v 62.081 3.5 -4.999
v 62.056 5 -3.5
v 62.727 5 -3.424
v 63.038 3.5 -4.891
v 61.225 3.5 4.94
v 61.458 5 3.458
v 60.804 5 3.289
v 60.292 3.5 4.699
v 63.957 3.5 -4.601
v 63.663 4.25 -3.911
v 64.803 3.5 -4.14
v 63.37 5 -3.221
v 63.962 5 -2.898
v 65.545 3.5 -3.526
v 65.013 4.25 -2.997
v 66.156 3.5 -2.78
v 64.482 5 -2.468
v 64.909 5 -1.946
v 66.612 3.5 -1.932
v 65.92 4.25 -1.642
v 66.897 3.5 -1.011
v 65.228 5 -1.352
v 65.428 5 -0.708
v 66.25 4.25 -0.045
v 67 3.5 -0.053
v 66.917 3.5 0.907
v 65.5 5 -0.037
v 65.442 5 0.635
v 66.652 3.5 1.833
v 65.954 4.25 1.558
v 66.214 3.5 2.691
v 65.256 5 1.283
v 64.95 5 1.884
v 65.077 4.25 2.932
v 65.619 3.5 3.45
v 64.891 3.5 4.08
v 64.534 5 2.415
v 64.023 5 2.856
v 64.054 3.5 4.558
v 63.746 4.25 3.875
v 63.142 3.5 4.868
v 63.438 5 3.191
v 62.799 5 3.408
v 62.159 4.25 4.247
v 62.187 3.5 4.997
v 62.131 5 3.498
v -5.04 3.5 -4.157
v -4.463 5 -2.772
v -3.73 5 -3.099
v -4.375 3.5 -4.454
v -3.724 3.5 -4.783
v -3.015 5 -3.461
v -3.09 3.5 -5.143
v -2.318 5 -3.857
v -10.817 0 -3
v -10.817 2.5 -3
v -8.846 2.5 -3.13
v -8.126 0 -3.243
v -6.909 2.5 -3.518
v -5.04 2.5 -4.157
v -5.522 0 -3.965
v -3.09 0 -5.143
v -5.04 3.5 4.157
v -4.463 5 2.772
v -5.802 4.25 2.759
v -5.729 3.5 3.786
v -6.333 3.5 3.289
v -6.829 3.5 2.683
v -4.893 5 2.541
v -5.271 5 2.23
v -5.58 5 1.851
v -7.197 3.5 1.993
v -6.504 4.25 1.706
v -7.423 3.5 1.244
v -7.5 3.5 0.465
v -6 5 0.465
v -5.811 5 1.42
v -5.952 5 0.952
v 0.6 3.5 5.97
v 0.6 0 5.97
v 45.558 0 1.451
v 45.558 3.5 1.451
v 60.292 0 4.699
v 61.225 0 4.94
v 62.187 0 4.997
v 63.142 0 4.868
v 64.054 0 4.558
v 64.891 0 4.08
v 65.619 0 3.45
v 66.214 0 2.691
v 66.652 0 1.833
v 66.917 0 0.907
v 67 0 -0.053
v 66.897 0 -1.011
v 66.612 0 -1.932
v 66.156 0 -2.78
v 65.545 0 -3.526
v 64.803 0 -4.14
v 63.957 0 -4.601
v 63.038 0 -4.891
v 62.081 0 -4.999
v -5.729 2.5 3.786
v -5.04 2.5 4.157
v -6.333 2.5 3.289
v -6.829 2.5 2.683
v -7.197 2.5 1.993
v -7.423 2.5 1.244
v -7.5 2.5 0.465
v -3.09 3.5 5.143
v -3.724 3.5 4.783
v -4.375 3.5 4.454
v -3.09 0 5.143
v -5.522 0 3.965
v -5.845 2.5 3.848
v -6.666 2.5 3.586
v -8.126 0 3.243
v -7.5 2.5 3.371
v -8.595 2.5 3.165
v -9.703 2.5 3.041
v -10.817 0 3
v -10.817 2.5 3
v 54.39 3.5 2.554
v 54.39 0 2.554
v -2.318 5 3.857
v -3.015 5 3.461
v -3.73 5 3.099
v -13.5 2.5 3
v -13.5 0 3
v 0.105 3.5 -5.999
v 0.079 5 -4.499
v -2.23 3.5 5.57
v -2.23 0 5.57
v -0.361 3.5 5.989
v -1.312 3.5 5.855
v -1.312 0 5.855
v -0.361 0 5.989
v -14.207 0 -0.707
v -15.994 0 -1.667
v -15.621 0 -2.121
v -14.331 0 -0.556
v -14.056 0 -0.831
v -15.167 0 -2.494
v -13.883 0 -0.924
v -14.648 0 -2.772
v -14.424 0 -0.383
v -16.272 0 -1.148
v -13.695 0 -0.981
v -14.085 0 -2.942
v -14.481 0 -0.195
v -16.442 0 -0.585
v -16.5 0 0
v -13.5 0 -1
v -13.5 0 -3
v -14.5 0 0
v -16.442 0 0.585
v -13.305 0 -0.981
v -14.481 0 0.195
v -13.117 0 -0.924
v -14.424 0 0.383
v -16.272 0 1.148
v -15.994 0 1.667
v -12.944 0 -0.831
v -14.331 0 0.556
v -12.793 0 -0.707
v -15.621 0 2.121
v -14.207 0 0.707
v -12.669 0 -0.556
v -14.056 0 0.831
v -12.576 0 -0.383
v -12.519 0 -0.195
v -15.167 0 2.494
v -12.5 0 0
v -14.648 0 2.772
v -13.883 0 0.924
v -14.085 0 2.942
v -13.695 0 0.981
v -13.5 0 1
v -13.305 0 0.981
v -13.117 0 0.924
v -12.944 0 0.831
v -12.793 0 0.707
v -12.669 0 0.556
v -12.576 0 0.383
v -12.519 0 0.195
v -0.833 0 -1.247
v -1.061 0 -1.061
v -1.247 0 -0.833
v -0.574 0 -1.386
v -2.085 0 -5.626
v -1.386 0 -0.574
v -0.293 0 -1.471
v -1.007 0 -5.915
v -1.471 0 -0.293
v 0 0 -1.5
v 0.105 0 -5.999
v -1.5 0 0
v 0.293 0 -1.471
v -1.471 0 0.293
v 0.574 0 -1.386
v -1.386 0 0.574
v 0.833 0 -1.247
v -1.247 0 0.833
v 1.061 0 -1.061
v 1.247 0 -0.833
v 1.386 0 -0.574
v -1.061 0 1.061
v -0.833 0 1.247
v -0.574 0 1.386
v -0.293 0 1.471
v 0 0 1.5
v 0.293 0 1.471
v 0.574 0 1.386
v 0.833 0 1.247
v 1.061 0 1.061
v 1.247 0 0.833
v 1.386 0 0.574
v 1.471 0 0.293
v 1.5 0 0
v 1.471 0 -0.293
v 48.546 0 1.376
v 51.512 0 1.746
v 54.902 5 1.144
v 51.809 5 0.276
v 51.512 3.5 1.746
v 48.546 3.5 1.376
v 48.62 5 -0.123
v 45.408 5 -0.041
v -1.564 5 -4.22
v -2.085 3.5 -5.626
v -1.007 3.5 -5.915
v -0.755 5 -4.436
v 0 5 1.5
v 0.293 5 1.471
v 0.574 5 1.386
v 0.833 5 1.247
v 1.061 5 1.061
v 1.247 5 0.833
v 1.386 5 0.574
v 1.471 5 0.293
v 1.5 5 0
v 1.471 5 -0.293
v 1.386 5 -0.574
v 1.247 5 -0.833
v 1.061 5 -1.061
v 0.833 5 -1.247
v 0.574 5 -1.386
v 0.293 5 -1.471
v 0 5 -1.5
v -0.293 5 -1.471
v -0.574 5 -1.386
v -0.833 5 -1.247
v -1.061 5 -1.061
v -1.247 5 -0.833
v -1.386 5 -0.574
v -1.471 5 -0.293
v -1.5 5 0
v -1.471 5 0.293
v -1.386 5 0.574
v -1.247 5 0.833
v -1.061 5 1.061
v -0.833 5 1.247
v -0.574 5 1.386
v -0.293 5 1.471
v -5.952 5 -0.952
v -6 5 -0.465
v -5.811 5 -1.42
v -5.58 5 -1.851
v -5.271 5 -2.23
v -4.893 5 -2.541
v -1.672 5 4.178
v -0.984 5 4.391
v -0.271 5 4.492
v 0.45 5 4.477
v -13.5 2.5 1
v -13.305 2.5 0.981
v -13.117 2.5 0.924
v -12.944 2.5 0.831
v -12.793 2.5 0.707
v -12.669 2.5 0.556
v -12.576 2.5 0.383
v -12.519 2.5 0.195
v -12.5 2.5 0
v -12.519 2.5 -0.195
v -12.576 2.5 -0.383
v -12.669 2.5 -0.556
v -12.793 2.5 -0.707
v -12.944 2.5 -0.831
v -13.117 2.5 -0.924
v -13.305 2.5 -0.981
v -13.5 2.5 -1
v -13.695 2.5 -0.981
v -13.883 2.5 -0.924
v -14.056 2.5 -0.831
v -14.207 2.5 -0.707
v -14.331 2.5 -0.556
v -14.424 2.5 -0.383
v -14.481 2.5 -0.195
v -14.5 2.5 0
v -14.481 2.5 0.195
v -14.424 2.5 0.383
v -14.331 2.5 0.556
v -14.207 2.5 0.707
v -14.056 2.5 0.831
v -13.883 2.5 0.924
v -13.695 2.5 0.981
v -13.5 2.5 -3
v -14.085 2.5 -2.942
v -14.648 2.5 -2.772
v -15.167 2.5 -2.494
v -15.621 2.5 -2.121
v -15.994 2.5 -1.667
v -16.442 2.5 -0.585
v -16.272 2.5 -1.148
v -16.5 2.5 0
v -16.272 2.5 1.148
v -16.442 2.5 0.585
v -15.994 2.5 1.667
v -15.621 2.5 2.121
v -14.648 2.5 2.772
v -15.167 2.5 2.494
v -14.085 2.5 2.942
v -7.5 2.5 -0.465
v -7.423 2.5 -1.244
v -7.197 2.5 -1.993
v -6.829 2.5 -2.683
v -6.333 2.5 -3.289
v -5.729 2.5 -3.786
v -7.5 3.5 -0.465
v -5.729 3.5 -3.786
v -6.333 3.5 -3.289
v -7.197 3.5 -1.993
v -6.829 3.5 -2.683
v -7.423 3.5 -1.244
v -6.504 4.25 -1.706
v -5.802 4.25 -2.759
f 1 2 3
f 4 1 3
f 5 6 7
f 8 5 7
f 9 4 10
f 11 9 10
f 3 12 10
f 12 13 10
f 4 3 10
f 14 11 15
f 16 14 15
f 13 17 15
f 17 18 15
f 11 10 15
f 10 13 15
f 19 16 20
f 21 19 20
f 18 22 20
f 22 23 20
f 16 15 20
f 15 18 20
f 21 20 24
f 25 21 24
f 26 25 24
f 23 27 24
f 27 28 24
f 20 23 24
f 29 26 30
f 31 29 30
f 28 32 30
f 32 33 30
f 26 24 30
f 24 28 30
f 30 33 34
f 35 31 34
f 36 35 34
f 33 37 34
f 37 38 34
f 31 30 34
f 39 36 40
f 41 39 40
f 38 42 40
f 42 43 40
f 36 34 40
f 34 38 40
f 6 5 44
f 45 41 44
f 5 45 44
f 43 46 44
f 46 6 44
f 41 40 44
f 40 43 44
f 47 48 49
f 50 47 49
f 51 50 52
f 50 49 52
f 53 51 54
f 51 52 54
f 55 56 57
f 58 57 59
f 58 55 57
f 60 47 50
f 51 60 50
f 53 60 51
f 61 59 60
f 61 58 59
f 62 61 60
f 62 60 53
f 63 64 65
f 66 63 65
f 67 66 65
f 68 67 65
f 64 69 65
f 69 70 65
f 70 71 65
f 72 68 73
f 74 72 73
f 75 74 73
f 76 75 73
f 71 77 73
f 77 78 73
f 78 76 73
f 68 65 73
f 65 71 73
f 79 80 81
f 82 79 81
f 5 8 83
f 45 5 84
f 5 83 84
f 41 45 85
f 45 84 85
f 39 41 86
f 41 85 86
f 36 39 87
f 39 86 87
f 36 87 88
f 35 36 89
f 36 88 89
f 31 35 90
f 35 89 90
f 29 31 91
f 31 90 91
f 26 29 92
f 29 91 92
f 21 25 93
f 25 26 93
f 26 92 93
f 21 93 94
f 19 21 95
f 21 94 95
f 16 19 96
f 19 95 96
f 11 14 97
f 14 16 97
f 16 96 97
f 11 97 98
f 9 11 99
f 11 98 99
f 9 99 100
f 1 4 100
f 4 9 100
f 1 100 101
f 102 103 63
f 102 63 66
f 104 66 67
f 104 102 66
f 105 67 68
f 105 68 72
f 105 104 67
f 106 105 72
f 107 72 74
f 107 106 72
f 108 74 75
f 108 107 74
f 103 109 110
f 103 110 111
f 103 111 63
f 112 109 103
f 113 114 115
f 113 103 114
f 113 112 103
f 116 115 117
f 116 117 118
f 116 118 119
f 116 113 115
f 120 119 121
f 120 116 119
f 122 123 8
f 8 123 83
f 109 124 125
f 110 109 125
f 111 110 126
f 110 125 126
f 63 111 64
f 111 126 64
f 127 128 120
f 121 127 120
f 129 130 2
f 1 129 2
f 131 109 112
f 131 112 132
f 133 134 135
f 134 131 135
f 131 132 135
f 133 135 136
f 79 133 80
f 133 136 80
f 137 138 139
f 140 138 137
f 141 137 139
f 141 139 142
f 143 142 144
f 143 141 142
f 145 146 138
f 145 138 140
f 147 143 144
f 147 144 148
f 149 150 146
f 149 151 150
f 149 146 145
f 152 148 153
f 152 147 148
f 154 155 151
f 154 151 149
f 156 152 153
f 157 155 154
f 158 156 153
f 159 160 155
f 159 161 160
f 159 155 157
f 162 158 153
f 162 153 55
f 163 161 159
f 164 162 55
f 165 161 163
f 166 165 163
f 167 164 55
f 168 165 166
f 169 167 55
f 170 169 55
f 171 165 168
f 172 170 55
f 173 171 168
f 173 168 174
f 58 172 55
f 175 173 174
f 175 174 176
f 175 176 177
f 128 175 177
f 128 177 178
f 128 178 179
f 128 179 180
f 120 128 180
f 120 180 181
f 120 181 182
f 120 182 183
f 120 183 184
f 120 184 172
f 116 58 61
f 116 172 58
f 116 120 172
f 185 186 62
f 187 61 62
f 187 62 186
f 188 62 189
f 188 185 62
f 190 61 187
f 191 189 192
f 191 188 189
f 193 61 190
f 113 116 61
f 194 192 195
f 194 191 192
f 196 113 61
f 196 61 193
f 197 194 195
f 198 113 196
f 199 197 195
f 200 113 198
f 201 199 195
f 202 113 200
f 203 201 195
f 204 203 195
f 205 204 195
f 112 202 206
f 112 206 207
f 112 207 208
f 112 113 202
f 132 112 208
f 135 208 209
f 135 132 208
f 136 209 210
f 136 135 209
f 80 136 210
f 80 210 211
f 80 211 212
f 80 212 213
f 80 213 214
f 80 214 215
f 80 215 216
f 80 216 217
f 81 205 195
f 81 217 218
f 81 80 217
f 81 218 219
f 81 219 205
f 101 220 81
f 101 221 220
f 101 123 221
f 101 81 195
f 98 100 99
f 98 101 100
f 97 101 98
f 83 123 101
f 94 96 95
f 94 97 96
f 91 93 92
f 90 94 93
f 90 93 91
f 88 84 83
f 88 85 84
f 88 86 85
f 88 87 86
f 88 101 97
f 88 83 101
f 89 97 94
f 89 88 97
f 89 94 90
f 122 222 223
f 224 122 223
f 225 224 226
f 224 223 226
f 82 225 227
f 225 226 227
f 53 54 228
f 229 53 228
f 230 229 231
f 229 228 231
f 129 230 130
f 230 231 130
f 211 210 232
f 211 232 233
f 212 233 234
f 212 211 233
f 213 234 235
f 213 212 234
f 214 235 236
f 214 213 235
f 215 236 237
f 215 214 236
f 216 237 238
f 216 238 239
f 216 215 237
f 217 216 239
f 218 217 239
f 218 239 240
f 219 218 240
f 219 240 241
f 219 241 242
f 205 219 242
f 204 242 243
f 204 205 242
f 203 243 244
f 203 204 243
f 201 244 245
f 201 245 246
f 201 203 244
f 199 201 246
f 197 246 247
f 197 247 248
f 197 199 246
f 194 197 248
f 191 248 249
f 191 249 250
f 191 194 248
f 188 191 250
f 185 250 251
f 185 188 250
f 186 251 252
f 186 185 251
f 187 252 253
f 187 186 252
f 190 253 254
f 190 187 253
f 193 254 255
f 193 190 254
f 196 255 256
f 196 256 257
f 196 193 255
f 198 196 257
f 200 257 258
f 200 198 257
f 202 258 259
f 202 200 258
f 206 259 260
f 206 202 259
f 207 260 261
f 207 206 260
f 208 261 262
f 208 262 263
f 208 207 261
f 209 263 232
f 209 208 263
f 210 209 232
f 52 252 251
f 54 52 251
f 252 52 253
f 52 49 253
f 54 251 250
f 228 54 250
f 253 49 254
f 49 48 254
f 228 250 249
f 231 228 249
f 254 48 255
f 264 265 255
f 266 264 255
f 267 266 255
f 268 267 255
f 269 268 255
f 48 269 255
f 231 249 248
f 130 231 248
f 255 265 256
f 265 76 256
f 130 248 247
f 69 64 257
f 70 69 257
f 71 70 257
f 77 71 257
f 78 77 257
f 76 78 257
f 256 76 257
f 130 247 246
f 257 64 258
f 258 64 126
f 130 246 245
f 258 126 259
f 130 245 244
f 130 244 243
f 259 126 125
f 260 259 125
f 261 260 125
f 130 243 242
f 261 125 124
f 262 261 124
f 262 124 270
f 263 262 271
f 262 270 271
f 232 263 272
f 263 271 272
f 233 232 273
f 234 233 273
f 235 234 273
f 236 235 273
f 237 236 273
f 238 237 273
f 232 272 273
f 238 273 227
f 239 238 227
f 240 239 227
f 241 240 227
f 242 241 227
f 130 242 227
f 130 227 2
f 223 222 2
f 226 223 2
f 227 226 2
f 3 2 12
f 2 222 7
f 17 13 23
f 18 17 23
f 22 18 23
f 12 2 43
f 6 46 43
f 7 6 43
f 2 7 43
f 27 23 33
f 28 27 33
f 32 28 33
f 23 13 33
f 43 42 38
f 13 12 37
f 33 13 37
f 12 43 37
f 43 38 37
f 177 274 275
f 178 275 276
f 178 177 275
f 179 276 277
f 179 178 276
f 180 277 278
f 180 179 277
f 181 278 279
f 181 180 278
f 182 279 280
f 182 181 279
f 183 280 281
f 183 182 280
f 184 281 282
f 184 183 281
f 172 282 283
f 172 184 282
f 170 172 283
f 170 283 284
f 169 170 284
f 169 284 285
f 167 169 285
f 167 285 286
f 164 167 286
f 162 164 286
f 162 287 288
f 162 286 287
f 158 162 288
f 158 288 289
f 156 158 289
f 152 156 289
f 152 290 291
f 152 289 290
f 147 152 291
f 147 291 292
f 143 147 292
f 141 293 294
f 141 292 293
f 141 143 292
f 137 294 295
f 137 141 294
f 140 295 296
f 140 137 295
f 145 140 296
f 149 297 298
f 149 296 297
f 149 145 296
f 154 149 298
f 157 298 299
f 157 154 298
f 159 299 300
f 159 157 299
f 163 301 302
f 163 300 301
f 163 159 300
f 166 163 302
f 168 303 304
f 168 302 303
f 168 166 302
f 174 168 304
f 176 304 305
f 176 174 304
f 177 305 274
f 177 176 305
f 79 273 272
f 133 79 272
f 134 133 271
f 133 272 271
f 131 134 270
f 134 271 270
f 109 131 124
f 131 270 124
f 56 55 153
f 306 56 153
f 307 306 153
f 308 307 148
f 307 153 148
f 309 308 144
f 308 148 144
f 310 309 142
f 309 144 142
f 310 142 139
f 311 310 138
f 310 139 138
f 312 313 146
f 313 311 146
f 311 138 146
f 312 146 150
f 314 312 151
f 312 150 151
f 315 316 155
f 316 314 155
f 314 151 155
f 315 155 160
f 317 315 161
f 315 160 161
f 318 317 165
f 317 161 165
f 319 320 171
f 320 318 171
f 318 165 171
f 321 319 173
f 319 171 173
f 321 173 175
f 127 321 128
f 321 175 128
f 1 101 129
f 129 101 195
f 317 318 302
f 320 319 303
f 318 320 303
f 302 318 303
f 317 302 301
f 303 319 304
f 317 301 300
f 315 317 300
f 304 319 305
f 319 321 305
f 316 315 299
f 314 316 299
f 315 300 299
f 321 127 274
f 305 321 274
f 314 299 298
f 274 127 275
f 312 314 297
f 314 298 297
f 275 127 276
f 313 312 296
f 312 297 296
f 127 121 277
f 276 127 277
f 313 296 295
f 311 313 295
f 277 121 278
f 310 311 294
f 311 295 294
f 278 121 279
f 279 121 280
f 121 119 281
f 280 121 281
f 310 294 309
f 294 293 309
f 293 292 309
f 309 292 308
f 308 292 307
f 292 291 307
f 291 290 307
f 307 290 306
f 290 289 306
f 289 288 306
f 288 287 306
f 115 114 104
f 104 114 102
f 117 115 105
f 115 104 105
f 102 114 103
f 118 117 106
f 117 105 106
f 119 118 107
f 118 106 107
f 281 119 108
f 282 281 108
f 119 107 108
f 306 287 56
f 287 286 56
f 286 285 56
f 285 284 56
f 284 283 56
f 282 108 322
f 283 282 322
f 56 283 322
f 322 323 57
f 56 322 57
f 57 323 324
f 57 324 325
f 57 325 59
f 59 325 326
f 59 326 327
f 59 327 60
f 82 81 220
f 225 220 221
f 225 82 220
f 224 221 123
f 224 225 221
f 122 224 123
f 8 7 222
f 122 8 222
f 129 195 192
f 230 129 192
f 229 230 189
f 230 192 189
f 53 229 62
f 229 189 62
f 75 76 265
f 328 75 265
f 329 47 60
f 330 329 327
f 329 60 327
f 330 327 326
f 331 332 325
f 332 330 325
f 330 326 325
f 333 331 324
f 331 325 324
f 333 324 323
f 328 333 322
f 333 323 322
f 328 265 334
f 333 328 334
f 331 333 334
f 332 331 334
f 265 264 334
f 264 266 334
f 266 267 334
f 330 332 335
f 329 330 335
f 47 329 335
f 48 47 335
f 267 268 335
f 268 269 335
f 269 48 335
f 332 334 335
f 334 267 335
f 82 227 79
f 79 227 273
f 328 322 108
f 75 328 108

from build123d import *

# Parameters (mm, degrees)
SKETCH1_R           = 1.5
SKETCH1_R_2         = 1
BOSS_EXTRUDE1_DEPTH = 5
FILLET1_R           = 20
CUT_EXTRUDE1_START  = -2.5
CUT_EXTRUDE1_DEPTH  = 2.5
FILLET5_R           = 15
FILLET6_R           = 4
CHAMFER1_SIZE       = 1.5


with BuildPart() as part:
    # Sketch1 → Boss-Extrude1 (new body)
    with BuildSketch(Plane(origin=(0, 0, 0), x_dir=(1, 0, 0), z_dir=(0, 1, 0))):
        with BuildLine():
            Line((0.6, -5.969924623), (50.1, -0.994987437))
            Line((50.1, -0.994987437), (60.292075574, -4.699254638))
            ThreePointArc((60.292075574, -4.699254638), (66.917086627, -0.906785038), (62.080644677, 4.999349601))
            Line((62.080644677, 4.999349601), (0.105263158, 5.999076568))
            ThreePointArc((0.105263158, 5.999076568), (-2.95430253, 5.222269292), (-5.196152423, 3))
            Line((-5.196152423, 3), (-13.5, 3))
            ThreePointArc((-13.5, 3), (-16.5, 0), (-13.5, -3))
            Line((-13.5, -3), (-5.196152423, -3))
            ThreePointArc((-5.196152423, -3), (-2.736104409, -5.339825153), (0.6, -5.969924623))
        make_face()
        with Locations(Location((0, 0, 0), (0, 0, 270))):
            Circle(SKETCH1_R, mode=Mode.SUBTRACT)
        with Locations(Location((-13.5, 0, 0), (0, 0, 270))):
            Circle(SKETCH1_R_2, mode=Mode.SUBTRACT)
    extrude(amount=BOSS_EXTRUDE1_DEPTH)

    # Fillet1
    fillet1_edges = [part.edges().sort_by_distance(p)[0] for p in [
        (50.1, 2.5, 0.994987437),
    ]]
    fillet(fillet1_edges, radius=FILLET1_R)

    # Sketch2 → Cut-Extrude1 (cut)
    with BuildSketch(Plane(origin=(0, 5, 0), x_dir=(1, 0, 0), z_dir=(0, 1, 0)).offset(CUT_EXTRUDE1_START)):
        with BuildLine():
            Line((-13.5, 3), (-7.5, 3))
            Line((-7.5, 3), (-7.5, -3))
            Line((-7.5, -3), (-13.5, -3))
            ThreePointArc((-13.5, -3), (-16.5, 0), (-13.5, 3))
        make_face()
    extrude(amount=CUT_EXTRUDE1_DEPTH, mode=Mode.SUBTRACT)

    # Fillet5
    # the kernel refuses this fillet: 15 mm, written as the material it adds along each edge
    with BuildSketch(Plane(origin=(-5.196152423, 0, 3), x_dir=(0.7008923394400669, 0, 0.7132670807728548), z_dir=(0, 1, 0))) as fillet5_piece_1_section:
        with BuildLine():
            CenterArc((6.759639834, -14.52230372), FILLET5_R, 104.498640433, 31.002719134)
            Line((-3.939366378, -4.008918629), (0, 0))
            ThreePointArc((0, 0), (1.502142185, -0.191078512), (3.004284371, 0))
        make_face()
    fillet5_piece_1 = extrude(amount=5, mode=Mode.PRIVATE)
    fillet5_piece_1 = split(fillet5_piece_1, bisect_by=Plane(origin=(-7.5, 1.25, 3.544303671), z_dir=(1, 0, 0)), keep=Keep.TOP, mode=Mode.PRIVATE)
    fillet5_piece_1 = split(fillet5_piece_1, bisect_by=Plane(origin=(-5.459248891, 2.5, 3.544303671), z_dir=(0, -1, 0)), keep=Keep.TOP, mode=Mode.PRIVATE)
    add(fillet5_piece_1)
    with BuildSketch(Plane(origin=(-5.196152423, 0, 3), x_dir=(0.7008923394400669, 0, 0.7132670807728548), z_dir=(0, 1, 0))) as fillet5_piece_2_section:
        with BuildLine():
            CenterArc((6.759639834, -14.52230372), FILLET5_R, 104.498640433, 31.002719134)
            Line((-3.939366378, -4.008918629), (0, 0))
            ThreePointArc((0, 0), (1.502142185, -0.191078512), (3.004284371, 0))
        make_face()
    fillet5_piece_2 = extrude(amount=5, mode=Mode.PRIVATE)
    fillet5_piece_2 = split(fillet5_piece_2, bisect_by=Plane(origin=(-7.5, 1.25, 2.925994162), z_dir=(-1, 0, 0)), keep=Keep.TOP, mode=Mode.PRIVATE)
    fillet5_piece_2 = split(fillet5_piece_2, bisect_by=Plane(origin=(-8.916431377, 2.5, 2.925994162), z_dir=(0, -1, 0)), keep=Keep.TOP, mode=Mode.PRIVATE)
    add(fillet5_piece_2)
    with BuildSketch(Plane(origin=(-5.196152423, 0, 3), x_dir=(0.7008923394400669, 0, 0.7132670807728548), z_dir=(0, 1, 0))) as fillet5_piece_3_section:
        with BuildLine():
            CenterArc((6.759639834, -14.52230372), FILLET5_R, 104.498640433, 31.002719134)
            Line((-3.939366378, -4.008918629), (0, 0))
            ThreePointArc((0, 0), (1.502142185, -0.191078512), (3.004284371, 0))
        make_face()
    fillet5_piece_3 = extrude(amount=5, mode=Mode.PRIVATE)
    fillet5_piece_3 = split(fillet5_piece_3, bisect_by=Plane(origin=(-7.5, 3.75, 3.544303671), z_dir=(1, 0, 0)), keep=Keep.TOP, mode=Mode.PRIVATE)
    fillet5_piece_3 = split(fillet5_piece_3, bisect_by=Plane(origin=(-5.459248891, 2.5, 3.544303671), z_dir=(0, 1, 0)), keep=Keep.TOP, mode=Mode.PRIVATE)
    add(fillet5_piece_3)
    with BuildSketch(Plane(origin=(-5.196152423, 0, -3), x_dir=(-1, 0, 0), z_dir=(0, 1, 0))) as fillet5_piece_4_section:
        with BuildLine():
            CenterArc((5.620501404, -15), FILLET5_R, 90, 31.002719134)
            ThreePointArc((-2.105679901, -2.142857143), (-0.916549938, -1.205354037), (0, 0))
            Line((0, 0), (5.620501404, 0))
        make_face()
    fillet5_piece_4 = extrude(amount=5, mode=Mode.PRIVATE)
    fillet5_piece_4 = split(fillet5_piece_4, bisect_by=Plane(origin=(-8.916431377, 2.5, -2.925994162), z_dir=(0, -1, 0)), keep=Keep.TOP, mode=Mode.PRIVATE)
    fillet5_piece_4 = split(fillet5_piece_4, bisect_by=Plane(origin=(-7.5, 1.25, -2.925994162), z_dir=(-1, 0, 0)), keep=Keep.TOP, mode=Mode.PRIVATE)
    add(fillet5_piece_4)
    with BuildSketch(Plane(origin=(-5.196152423, 0, -3), x_dir=(-1, 0, 0), z_dir=(0, 1, 0))) as fillet5_piece_5_section:
        with BuildLine():
            CenterArc((5.620501404, -15), FILLET5_R, 90, 31.002719134)
            ThreePointArc((-2.105679901, -2.142857143), (-0.916549938, -1.205354037), (0, 0))
            Line((0, 0), (5.620501404, 0))
        make_face()
    fillet5_piece_5 = extrude(amount=5, mode=Mode.PRIVATE)
    fillet5_piece_5 = split(fillet5_piece_5, bisect_by=Plane(origin=(-5.459248891, 2.5, -3.544303671), z_dir=(0, -1, 0)), keep=Keep.TOP, mode=Mode.PRIVATE)
    fillet5_piece_5 = split(fillet5_piece_5, bisect_by=Plane(origin=(-7.5, 1.25, -3.544303671), z_dir=(1, 0, 0)), keep=Keep.TOP, mode=Mode.PRIVATE)
    add(fillet5_piece_5)
    with BuildSketch(Plane(origin=(-5.196152423, 0, -3), x_dir=(-1, 0, 0), z_dir=(0, 1, 0))) as fillet5_piece_6_section:
        with BuildLine():
            CenterArc((5.620501404, -15), FILLET5_R, 90, 31.002719134)
            ThreePointArc((-2.105679901, -2.142857143), (-0.916549938, -1.205354037), (0, 0))
            Line((0, 0), (5.620501404, 0))
        make_face()
    fillet5_piece_6 = extrude(amount=5, mode=Mode.PRIVATE)
    fillet5_piece_6 = split(fillet5_piece_6, bisect_by=Plane(origin=(-5.459248891, 2.5, -3.544303671), z_dir=(0, 1, 0)), keep=Keep.TOP, mode=Mode.PRIVATE)
    fillet5_piece_6 = split(fillet5_piece_6, bisect_by=Plane(origin=(-7.5, 3.75, -3.544303671), z_dir=(1, 0, 0)), keep=Keep.TOP, mode=Mode.PRIVATE)
    add(fillet5_piece_6)

    # Fillet6
    fillet6_edges = [part.edges().sort_by_distance(p)[0] for p in [
        (-7.5, 3.75, 3.371267745),
        (-7.5, 3.75, -3.371267745),
    ]]
    fillet(fillet6_edges, radius=FILLET6_R)

    # Chamfer1
    chamfer1_edges = [part.edges().sort_by_distance(p)[0] for p in [
        (-4.047431746, 5, -4.614275051),
        (-6.828767993, 5, -2.683225442),
        (-7.5, 5, 0),
        (-6.828767993, 5, 2.683225442),
        (-4.047431746, 5, 4.614275051),
        (-1.312106512, 5, 5.854773821),
        (23.079157013, 5, 3.710684337),
        (50.036282779, 5, 1.505294708),
        (57.341043652, 5, 3.62671444),
        (66.917086627, 5, 0.906785038),
        (31.092953917, 5, -5.499213085),
        (-1.552786741, 5, -5.795589128),
    ]]
    chamfer(chamfer1_edges, length=CHAMFER1_SIZE)


solid = part.part
